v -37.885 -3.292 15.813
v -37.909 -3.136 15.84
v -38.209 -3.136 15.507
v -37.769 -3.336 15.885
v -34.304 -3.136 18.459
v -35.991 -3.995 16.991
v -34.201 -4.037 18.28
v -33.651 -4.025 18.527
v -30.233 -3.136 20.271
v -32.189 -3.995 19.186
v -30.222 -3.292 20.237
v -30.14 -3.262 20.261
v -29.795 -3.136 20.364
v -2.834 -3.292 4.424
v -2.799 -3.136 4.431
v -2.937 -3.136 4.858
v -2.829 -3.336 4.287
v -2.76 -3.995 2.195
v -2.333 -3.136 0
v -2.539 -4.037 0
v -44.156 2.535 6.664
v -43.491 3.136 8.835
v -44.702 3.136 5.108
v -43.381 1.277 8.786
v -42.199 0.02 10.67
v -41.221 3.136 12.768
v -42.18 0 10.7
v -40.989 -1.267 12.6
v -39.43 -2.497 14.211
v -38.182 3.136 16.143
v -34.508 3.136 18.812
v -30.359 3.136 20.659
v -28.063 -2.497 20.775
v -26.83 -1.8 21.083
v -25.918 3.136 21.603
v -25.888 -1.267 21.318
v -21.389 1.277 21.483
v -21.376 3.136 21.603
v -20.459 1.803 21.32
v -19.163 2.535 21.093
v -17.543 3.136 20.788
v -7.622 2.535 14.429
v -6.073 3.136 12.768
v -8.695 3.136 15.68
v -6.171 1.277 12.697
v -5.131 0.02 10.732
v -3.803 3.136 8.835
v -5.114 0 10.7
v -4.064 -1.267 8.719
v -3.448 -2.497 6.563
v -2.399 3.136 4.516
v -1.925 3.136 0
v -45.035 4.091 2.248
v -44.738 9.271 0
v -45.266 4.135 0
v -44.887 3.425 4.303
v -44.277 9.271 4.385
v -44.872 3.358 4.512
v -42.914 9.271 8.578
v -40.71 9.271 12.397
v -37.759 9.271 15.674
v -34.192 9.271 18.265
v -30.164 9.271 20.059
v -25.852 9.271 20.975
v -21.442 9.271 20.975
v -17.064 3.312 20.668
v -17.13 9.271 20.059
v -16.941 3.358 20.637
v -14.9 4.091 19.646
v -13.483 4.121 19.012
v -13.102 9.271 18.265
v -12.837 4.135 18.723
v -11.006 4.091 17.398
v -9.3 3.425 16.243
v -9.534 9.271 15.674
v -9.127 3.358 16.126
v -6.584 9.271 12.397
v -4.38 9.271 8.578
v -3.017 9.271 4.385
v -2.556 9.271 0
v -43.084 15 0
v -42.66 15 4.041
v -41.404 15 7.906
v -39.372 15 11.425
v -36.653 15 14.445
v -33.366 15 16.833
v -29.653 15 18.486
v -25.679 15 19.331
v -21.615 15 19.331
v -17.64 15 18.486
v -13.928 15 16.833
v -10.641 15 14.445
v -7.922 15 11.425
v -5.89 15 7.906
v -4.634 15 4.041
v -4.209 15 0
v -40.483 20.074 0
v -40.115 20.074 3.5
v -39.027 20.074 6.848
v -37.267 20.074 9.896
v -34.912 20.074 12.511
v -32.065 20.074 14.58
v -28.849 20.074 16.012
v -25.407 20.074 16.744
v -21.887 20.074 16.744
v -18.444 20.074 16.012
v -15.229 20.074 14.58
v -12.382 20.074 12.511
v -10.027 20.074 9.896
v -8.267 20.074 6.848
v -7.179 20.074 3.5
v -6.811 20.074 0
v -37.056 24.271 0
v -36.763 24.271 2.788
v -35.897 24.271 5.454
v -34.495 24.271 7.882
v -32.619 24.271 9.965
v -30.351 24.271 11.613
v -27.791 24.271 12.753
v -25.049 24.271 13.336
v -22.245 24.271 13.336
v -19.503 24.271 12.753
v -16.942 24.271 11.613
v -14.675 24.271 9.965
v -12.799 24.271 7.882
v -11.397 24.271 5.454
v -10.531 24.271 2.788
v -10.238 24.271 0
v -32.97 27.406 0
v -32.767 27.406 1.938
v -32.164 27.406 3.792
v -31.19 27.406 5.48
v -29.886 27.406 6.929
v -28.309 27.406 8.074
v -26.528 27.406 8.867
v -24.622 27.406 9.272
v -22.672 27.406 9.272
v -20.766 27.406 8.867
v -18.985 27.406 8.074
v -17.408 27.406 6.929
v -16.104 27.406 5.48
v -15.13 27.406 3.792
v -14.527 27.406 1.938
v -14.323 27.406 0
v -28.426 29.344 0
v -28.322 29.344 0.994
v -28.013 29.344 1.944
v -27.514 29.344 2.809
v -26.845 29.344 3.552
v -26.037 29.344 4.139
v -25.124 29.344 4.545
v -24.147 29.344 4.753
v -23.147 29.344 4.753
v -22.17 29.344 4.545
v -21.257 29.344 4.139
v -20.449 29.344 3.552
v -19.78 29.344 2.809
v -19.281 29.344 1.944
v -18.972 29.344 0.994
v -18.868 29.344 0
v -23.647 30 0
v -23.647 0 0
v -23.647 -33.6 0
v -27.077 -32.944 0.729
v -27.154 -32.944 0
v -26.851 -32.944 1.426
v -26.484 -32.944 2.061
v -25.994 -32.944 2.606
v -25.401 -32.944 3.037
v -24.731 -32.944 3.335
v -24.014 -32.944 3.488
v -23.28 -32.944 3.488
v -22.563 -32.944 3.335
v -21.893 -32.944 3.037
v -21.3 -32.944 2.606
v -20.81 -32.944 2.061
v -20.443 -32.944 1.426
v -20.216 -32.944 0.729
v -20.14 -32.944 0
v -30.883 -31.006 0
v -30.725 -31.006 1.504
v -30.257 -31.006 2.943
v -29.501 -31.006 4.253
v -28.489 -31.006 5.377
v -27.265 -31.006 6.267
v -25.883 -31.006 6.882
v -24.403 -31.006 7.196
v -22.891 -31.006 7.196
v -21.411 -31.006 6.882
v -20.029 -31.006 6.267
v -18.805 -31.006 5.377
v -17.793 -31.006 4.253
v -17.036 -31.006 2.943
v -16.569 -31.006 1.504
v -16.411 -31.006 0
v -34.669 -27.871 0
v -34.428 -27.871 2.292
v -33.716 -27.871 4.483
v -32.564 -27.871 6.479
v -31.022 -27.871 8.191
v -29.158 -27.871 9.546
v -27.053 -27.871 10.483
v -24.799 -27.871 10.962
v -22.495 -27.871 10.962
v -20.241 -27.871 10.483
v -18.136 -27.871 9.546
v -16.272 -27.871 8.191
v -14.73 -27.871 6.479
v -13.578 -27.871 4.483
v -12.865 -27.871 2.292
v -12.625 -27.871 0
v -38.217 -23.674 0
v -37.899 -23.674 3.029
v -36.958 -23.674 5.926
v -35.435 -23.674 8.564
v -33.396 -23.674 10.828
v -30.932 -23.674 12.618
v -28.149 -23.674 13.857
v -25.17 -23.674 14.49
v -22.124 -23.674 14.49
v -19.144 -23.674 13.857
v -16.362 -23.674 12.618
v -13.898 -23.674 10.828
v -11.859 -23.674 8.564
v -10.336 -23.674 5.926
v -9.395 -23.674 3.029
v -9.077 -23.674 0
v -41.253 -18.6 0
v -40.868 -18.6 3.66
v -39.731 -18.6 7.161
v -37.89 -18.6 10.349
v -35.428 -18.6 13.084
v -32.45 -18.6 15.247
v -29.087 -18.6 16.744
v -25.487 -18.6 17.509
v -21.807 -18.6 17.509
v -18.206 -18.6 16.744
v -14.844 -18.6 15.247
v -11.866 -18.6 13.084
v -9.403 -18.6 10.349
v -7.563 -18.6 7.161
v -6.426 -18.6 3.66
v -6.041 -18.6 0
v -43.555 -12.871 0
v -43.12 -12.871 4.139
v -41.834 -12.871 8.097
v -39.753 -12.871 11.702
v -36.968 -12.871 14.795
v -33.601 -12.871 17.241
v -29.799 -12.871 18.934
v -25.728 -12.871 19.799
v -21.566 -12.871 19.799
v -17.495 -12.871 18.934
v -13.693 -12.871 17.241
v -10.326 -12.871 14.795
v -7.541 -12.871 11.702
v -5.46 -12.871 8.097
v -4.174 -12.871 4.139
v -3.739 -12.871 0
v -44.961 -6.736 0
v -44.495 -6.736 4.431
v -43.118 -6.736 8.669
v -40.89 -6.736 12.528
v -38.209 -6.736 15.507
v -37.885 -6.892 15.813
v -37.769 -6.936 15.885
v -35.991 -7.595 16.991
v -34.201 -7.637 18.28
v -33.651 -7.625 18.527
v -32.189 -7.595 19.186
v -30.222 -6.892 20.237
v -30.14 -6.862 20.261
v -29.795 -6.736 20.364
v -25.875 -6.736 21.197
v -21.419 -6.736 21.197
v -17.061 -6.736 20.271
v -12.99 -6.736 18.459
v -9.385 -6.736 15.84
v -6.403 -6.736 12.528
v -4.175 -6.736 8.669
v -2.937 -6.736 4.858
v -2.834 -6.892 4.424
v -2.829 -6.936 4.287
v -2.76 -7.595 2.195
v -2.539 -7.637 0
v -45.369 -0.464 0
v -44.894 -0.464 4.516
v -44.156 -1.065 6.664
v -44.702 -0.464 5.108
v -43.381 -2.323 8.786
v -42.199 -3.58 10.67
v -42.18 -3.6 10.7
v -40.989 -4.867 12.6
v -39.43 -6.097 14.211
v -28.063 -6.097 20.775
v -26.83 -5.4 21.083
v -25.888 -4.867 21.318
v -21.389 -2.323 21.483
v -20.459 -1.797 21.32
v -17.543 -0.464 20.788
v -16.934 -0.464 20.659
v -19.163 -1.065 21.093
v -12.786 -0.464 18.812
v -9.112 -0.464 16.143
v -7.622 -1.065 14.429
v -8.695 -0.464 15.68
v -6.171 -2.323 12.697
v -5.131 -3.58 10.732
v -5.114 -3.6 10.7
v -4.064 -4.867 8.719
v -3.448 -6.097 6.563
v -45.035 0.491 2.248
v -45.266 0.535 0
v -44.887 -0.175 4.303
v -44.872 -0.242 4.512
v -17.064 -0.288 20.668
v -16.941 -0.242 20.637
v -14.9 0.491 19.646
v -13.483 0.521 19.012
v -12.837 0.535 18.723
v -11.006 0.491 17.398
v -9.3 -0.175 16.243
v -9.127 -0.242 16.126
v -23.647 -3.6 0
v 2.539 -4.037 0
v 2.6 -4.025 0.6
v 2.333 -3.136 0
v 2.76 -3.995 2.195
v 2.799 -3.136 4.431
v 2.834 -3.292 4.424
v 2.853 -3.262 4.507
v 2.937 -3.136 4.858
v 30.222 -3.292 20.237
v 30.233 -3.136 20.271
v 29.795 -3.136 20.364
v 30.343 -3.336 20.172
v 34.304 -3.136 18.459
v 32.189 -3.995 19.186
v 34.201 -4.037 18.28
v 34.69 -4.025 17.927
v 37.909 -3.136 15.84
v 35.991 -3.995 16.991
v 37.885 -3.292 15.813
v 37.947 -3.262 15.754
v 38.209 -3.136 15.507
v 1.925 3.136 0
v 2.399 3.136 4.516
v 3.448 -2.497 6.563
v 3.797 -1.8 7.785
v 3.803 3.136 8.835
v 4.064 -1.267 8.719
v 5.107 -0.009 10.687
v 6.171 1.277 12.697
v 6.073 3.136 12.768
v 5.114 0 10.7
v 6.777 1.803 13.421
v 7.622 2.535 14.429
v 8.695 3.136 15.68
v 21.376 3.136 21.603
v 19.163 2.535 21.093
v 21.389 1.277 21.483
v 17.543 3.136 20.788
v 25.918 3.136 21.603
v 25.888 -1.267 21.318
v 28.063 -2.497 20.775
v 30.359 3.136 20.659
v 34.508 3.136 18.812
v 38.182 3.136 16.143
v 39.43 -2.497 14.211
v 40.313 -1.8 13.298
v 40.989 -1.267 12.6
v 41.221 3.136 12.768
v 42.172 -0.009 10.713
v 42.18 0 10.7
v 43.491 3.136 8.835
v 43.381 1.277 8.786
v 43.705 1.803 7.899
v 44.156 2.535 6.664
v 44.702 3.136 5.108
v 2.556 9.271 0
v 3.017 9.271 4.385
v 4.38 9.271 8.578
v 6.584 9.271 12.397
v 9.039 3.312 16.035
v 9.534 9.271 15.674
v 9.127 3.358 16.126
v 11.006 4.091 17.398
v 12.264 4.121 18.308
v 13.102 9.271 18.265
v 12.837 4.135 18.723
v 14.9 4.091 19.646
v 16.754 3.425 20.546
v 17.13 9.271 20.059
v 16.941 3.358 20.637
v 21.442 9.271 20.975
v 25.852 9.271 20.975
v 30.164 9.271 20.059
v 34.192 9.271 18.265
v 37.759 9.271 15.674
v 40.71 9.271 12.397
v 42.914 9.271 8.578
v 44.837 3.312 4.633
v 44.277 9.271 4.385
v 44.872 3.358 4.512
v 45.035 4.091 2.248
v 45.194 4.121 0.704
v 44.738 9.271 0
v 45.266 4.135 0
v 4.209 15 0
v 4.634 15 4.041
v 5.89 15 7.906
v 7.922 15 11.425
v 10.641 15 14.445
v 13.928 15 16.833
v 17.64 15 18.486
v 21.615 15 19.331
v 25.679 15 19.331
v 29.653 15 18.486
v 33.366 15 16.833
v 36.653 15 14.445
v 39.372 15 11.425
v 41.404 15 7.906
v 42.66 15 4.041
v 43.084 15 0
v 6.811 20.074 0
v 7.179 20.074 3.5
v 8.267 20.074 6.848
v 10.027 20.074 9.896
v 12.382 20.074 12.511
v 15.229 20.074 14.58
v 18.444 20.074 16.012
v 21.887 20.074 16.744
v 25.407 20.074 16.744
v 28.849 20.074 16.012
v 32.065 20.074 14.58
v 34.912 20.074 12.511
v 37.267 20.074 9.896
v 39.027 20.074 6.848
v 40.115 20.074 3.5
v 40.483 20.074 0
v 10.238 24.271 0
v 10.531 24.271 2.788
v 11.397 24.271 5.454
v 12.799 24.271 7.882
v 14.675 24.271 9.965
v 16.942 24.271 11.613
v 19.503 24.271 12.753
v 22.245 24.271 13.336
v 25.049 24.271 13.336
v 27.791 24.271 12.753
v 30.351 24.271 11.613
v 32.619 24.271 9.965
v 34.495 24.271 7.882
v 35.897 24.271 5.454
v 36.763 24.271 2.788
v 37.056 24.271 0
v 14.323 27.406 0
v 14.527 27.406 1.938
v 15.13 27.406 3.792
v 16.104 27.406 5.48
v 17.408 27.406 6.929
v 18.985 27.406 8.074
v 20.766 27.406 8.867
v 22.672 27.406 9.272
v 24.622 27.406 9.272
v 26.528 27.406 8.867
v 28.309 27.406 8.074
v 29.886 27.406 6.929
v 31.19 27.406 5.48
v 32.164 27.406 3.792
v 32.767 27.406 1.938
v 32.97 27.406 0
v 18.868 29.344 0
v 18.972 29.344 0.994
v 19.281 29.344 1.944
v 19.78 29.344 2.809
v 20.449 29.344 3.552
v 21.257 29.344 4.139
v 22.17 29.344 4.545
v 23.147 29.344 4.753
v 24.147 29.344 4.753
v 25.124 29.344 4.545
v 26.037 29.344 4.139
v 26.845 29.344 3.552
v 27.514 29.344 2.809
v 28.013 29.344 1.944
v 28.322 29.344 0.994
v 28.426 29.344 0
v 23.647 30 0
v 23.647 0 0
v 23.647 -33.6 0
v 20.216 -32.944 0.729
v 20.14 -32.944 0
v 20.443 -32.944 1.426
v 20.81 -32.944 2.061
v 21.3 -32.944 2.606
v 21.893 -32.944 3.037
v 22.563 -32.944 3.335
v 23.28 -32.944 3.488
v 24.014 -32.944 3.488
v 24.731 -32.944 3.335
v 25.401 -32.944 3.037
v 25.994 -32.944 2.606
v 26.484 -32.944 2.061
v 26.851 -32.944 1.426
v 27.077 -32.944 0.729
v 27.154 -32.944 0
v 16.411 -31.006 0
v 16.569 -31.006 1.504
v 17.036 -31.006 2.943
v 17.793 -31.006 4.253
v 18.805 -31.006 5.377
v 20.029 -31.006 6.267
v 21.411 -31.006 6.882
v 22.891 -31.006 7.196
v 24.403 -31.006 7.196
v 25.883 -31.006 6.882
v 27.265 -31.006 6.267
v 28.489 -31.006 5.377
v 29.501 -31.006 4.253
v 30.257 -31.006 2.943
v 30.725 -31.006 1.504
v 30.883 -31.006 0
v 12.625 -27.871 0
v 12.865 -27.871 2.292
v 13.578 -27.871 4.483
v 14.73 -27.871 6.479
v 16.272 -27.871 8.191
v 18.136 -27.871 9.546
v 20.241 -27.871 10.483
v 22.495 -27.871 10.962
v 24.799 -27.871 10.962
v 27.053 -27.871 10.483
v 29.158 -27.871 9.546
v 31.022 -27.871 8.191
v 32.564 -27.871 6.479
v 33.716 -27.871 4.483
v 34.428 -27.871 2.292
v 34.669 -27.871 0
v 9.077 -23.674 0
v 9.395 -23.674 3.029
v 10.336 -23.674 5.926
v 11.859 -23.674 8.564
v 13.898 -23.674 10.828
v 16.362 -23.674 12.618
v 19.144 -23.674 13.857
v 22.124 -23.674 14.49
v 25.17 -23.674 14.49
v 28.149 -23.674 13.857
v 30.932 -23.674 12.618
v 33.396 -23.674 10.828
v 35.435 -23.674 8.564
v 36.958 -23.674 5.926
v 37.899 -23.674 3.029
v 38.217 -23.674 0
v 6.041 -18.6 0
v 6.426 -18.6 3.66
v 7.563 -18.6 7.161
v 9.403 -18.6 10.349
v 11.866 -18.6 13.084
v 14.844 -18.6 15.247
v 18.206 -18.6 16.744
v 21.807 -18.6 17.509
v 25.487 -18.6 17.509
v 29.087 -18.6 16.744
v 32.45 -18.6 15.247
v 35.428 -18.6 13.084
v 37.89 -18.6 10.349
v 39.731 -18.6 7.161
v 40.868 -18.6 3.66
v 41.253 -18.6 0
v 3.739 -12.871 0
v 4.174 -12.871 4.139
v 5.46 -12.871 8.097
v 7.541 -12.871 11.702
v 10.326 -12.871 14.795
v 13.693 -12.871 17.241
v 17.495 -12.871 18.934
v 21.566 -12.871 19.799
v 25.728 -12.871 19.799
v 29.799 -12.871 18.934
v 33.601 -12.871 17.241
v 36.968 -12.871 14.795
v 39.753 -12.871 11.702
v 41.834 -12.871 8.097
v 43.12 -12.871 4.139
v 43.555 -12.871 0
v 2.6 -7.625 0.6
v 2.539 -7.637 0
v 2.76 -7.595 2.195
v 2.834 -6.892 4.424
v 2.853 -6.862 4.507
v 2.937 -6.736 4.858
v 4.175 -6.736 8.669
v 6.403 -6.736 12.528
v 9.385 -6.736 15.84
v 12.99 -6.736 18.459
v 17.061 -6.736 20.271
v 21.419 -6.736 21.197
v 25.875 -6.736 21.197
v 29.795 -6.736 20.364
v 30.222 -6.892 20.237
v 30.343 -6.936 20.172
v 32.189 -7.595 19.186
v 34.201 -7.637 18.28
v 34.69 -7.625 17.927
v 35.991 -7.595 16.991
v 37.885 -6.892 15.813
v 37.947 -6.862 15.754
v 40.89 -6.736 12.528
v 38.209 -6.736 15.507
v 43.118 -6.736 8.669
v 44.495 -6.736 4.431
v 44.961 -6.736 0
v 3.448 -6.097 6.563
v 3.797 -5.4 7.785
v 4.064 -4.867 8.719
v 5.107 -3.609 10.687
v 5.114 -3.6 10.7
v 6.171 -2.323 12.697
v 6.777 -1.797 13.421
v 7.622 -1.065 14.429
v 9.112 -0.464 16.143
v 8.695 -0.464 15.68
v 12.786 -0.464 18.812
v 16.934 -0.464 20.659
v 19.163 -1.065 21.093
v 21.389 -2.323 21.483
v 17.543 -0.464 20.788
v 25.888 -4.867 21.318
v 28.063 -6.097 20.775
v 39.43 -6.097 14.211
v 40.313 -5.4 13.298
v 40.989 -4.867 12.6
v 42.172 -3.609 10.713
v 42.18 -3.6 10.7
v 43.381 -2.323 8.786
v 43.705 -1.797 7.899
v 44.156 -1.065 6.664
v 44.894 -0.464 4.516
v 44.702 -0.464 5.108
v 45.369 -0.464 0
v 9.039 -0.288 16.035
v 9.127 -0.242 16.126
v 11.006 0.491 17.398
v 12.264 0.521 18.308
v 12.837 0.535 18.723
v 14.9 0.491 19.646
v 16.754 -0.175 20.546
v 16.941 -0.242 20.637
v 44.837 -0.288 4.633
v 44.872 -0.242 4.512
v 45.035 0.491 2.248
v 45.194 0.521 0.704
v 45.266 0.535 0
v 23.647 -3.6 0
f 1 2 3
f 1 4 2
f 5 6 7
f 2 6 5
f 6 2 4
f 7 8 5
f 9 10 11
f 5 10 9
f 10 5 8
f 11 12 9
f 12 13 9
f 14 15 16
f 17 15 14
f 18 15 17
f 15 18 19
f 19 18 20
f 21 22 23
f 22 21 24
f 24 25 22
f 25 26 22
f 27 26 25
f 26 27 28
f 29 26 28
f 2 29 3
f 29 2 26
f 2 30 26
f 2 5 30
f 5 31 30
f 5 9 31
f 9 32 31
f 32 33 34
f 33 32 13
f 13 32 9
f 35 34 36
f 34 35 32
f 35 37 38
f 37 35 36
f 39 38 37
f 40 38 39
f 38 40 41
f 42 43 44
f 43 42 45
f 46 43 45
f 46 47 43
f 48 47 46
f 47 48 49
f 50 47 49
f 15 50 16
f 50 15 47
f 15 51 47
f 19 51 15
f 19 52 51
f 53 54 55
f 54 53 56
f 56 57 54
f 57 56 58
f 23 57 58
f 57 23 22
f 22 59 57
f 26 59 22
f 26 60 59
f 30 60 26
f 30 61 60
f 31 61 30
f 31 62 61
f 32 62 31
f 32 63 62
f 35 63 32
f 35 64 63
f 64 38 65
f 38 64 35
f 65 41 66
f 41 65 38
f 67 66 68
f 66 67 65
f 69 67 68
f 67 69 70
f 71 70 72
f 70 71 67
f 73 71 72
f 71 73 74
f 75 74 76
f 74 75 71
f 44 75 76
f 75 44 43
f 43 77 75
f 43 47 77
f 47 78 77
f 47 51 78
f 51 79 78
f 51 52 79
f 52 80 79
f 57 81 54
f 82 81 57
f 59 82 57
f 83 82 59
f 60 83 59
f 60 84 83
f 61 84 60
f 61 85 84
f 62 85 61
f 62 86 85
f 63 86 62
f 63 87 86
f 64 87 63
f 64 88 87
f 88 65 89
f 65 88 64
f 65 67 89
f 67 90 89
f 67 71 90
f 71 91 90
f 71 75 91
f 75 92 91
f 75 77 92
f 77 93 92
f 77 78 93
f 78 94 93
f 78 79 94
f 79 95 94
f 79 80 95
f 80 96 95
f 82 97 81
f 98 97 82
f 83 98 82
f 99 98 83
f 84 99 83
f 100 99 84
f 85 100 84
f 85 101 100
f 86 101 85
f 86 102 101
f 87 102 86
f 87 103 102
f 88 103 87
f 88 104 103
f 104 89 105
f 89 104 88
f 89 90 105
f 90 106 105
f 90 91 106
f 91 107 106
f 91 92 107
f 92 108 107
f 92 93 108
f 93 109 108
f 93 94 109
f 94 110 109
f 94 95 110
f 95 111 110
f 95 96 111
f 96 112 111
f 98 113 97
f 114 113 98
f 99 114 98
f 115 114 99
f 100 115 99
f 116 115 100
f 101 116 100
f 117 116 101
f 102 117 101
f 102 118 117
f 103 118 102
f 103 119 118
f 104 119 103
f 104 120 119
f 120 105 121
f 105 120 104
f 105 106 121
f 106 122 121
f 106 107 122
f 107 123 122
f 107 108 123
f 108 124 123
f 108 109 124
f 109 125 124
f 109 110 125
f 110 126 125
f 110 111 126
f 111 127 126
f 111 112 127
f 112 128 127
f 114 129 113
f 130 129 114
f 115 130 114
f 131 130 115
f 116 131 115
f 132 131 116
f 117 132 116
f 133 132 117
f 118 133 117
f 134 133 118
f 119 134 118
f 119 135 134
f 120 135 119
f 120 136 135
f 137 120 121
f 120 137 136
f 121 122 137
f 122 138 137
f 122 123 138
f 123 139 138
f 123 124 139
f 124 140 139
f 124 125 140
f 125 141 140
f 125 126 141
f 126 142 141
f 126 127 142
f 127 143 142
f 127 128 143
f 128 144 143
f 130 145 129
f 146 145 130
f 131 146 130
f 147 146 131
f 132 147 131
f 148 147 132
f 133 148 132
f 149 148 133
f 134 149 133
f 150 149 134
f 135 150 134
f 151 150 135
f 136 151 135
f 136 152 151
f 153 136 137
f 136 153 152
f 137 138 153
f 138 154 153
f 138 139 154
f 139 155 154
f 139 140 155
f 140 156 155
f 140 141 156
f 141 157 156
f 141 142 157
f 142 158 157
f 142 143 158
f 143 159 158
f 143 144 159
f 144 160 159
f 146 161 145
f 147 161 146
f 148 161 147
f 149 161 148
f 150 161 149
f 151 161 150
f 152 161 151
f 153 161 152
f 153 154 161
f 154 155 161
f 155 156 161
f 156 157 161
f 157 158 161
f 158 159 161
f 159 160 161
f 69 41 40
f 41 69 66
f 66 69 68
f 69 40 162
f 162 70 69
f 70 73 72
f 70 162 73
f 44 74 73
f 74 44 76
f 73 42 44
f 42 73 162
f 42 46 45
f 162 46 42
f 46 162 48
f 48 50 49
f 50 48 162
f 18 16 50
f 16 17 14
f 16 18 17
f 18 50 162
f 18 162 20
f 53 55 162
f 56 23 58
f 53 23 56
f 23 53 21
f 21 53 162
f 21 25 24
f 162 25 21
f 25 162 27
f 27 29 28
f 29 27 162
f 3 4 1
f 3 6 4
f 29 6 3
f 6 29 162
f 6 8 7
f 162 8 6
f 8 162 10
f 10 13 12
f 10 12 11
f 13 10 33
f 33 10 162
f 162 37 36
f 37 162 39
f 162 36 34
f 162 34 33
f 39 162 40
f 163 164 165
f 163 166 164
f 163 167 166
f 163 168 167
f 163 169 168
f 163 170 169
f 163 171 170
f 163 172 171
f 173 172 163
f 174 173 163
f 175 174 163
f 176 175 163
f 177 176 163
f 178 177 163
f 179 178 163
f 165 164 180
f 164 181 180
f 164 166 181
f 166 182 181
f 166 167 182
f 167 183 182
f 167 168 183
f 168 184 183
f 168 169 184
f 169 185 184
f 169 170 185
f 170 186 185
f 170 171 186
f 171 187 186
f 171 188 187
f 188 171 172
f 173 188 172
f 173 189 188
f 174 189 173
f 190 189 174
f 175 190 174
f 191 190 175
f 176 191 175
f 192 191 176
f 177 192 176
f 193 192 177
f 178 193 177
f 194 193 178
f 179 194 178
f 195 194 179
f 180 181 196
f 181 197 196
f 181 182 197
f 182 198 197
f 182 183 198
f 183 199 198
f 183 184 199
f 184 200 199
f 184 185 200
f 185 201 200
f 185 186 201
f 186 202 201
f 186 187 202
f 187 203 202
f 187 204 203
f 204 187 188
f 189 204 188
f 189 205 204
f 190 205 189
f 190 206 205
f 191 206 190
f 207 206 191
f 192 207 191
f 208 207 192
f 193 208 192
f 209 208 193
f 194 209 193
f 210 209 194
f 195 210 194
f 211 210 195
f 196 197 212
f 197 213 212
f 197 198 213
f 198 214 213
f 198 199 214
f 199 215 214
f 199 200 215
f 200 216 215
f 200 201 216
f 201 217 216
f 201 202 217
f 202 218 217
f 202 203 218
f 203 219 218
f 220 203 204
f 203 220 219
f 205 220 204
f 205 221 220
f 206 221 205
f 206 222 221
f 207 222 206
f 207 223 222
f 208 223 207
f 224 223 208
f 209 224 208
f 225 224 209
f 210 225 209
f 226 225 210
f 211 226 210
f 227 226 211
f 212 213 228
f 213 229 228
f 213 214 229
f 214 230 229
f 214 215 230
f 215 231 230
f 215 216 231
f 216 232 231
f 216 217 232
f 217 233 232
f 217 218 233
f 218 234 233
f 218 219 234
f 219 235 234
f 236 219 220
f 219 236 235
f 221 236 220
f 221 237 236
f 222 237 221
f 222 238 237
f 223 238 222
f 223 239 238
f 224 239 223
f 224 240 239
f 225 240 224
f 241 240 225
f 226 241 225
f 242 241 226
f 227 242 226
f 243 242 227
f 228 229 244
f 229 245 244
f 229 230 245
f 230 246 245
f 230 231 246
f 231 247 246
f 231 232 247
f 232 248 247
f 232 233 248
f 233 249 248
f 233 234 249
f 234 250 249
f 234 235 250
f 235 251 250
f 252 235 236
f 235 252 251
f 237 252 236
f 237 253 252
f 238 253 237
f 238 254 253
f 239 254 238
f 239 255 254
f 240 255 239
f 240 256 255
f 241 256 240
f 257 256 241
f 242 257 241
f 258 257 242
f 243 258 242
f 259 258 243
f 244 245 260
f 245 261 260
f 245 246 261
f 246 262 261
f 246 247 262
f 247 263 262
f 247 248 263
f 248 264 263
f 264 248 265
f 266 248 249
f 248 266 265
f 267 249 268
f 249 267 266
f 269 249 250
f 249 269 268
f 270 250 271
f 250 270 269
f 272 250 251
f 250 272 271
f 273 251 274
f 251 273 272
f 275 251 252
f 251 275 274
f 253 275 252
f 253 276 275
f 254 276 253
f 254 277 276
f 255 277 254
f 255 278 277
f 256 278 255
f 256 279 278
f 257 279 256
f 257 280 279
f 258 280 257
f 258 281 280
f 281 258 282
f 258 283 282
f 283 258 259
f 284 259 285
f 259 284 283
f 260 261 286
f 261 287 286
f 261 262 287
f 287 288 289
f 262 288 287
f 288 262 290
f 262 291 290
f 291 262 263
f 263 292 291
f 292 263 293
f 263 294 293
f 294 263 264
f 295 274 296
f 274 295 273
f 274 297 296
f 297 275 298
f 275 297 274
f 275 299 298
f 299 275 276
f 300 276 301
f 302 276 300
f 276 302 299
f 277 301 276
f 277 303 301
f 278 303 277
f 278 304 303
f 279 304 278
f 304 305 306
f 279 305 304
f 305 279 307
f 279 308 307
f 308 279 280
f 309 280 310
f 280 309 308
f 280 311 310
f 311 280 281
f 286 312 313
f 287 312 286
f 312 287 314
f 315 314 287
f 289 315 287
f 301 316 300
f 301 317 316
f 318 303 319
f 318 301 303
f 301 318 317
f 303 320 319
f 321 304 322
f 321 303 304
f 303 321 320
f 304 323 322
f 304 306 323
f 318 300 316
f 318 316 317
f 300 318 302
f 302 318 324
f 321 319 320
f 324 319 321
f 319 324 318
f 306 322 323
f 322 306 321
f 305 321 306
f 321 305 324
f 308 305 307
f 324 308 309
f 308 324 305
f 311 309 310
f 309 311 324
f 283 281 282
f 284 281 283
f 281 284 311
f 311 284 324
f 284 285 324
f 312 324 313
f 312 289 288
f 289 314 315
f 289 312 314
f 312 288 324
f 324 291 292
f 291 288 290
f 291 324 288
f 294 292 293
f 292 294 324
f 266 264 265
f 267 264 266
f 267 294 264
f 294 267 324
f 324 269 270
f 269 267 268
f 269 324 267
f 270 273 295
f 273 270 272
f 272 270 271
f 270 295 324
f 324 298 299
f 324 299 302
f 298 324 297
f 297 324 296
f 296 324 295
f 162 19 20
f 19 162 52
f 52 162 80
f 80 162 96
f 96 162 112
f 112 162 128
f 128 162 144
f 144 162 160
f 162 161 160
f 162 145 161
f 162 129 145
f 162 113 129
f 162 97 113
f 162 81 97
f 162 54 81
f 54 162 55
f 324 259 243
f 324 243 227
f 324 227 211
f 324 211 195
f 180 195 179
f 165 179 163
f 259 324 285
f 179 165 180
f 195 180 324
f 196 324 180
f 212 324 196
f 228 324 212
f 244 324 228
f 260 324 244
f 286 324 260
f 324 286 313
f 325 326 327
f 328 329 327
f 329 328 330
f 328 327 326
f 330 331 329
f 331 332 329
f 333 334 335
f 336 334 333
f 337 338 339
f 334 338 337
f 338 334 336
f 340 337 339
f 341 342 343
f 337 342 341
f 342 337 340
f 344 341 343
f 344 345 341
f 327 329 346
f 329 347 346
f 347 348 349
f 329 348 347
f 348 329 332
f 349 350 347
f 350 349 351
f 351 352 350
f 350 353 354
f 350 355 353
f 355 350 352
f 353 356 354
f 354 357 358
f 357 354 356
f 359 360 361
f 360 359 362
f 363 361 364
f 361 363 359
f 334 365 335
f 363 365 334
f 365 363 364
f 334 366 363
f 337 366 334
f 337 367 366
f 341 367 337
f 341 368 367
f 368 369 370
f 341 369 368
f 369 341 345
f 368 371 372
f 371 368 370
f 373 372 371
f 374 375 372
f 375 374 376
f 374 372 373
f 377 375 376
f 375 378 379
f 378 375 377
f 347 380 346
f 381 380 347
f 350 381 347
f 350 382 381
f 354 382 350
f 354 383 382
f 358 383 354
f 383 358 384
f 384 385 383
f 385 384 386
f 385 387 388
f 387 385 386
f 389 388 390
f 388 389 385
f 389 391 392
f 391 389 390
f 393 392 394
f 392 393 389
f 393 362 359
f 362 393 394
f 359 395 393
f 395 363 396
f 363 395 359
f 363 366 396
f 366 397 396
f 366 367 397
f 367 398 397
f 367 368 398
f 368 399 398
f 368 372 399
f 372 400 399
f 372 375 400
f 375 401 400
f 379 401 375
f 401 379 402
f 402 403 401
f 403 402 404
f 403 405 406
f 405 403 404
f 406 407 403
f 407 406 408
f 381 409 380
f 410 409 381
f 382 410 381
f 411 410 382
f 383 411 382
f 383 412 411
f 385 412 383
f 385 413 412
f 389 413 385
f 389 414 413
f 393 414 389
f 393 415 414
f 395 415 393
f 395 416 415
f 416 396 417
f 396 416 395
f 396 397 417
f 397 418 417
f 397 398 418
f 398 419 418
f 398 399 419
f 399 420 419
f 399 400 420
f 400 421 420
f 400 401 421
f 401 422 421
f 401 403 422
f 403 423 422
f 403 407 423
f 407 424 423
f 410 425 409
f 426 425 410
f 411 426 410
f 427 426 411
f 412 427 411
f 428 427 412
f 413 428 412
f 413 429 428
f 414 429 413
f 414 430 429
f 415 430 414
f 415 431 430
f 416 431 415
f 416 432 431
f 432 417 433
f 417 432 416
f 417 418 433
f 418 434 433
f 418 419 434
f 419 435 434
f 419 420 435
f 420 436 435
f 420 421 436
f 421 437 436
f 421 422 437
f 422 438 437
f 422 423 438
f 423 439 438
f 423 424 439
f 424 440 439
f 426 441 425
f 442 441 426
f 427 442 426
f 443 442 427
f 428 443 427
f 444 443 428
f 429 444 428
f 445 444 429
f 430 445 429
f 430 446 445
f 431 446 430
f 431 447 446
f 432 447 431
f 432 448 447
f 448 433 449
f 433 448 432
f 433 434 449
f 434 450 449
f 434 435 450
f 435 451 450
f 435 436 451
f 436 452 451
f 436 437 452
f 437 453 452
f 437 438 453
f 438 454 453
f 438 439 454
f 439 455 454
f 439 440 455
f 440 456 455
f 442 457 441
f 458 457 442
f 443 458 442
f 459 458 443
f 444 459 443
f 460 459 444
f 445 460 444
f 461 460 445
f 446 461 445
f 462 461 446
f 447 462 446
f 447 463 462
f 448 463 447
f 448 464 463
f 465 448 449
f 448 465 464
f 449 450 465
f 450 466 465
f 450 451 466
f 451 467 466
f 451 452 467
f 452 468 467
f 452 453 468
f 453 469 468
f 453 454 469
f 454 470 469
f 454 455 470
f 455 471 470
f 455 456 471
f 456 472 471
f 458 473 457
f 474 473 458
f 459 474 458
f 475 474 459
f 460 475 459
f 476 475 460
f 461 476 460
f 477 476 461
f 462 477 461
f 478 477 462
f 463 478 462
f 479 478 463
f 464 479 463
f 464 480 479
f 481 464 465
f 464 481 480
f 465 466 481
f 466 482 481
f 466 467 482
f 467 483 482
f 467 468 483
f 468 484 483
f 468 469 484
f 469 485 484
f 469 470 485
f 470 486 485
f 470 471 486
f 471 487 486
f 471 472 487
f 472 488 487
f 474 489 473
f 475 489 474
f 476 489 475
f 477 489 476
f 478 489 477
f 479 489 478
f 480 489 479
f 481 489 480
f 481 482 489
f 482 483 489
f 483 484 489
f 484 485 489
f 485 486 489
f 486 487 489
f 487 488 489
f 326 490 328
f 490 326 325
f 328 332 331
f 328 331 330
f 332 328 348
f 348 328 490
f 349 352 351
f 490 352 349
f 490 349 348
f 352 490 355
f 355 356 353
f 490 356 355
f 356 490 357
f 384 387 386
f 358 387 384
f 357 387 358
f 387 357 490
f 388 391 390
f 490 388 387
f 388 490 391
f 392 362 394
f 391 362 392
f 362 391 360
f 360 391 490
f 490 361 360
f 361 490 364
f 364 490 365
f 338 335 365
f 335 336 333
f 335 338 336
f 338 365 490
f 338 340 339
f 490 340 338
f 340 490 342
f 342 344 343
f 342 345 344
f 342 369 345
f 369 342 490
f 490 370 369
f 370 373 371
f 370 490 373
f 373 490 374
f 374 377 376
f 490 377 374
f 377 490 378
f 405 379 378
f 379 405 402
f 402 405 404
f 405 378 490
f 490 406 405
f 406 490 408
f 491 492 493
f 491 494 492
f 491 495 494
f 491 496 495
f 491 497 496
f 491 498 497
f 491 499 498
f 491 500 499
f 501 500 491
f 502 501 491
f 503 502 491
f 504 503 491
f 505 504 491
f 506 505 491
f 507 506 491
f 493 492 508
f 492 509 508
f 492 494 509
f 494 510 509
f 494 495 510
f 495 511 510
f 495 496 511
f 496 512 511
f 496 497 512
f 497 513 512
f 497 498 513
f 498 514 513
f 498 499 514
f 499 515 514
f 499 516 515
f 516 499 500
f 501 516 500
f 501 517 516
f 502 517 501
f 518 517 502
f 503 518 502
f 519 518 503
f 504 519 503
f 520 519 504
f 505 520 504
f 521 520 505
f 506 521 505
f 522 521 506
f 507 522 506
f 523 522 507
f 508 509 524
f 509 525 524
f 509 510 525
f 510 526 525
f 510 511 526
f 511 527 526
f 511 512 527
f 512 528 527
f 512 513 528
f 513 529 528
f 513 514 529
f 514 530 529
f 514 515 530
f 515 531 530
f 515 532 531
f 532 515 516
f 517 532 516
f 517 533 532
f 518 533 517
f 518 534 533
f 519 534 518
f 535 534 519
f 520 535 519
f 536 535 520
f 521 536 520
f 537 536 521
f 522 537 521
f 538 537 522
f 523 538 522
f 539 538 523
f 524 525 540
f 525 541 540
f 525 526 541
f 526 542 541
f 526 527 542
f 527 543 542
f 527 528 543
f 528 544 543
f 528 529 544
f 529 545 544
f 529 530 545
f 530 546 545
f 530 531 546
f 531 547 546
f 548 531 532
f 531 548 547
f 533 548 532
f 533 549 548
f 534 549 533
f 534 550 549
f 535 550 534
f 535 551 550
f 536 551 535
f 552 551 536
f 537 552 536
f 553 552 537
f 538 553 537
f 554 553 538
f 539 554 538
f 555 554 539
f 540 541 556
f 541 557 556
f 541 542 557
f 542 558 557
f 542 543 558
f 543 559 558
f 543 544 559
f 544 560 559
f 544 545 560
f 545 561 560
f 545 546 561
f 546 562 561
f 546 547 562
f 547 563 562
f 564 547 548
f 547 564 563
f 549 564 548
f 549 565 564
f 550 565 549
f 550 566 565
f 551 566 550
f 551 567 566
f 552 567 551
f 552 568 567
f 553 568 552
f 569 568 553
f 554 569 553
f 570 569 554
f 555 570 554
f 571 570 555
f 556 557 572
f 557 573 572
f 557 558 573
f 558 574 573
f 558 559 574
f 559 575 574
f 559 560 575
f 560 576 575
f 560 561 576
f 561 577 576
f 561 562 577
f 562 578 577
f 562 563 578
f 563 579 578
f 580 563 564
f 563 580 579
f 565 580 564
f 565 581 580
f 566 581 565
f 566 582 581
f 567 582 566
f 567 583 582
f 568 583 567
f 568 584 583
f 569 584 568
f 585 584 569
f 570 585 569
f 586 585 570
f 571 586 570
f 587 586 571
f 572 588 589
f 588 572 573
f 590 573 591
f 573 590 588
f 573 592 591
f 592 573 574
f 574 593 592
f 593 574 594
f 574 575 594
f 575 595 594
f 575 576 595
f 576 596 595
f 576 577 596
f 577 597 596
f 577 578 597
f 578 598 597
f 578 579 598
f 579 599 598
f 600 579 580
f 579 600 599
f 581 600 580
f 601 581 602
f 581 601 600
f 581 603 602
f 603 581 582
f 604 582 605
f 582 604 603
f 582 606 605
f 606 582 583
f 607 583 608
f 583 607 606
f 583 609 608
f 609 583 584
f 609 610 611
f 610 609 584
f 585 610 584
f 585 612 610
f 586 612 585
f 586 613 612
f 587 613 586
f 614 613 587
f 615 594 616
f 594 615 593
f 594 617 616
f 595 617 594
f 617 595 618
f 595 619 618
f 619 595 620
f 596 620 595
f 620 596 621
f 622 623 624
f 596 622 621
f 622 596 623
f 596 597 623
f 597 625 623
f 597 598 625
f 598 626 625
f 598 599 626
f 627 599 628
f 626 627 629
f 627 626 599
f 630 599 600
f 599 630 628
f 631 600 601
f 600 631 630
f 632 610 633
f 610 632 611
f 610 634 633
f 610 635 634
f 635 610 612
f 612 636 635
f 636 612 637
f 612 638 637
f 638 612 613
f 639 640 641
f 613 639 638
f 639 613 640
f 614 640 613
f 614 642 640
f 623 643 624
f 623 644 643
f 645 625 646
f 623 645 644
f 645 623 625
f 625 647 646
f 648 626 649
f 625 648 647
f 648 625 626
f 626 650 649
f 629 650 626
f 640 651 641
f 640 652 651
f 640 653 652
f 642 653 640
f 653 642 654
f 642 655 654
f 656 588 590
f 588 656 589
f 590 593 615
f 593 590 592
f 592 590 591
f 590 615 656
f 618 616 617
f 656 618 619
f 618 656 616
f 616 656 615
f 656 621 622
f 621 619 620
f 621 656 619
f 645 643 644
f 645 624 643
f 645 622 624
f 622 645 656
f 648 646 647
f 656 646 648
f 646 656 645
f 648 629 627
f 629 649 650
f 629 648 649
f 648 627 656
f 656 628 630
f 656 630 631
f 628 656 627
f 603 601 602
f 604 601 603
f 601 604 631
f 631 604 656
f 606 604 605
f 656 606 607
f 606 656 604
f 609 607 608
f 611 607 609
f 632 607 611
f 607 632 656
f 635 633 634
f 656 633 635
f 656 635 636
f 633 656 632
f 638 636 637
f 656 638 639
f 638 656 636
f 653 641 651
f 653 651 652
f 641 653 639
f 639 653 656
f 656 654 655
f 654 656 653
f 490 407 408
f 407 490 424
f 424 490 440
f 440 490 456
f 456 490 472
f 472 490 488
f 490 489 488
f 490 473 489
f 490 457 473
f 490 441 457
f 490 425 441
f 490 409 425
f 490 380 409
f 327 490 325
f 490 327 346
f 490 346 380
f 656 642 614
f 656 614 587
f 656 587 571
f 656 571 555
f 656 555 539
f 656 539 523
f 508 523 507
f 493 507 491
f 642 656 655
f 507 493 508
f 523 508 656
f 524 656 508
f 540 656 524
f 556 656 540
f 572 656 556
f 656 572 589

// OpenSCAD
//Easter Egg Maker 2016 from Richard Swika'
//Rev: 1.3.28.0 - centered abssin function for more even pieces
//Rev: 1.3.27.0 - first version
//2014-2016 Richard Swika -  Creative Commons - Attribution - Non-Commercial license.

/* [EggOMatic] */
//use 1 for draft; turn up to 5 for best quality but slower regenerate
Quality=1; //[1:5]

//number of pieces cut across long axis of egg
AxleSliceCount=2; //[1:10]

//type of wave used for cutter (does not apply for flat cutter)
Shape="sin"; //[sin,abssin,tri,saw,square]

//type of cutter used on long axis of egg
Cutter="radial"; //[flat,linear,radial]

//Number of cycles for cutter wave
Cycles=3; //[1:16]

//Relative amplitude of cutter wave (normally keep this at 1 or 2, depending on slice count)
Amp=2; //[0:9]

//number of rotary slices (normally keep this at 2; use caution with values greater than 2)
RotarySliceCount=2; //[2:12]

Samples=Quality*10*Cycles;

/* [Size and Shape] */

//Length of the egg (mm)?.
egg_length=60; //[30:200]

//What shape egg? (use 7 for a hen egg; 0 for a sphere; 100 for a blimp)
egg_shape=7; //[0:100]

/* [Hidden] */
// preview[view:top, tilt:top]
tiny=0.001;
space=2; //2 mm between parts on build plate

//set true to turn off the demo egg so you can use the modules instead
moduleMode=false; //[false,true];

//when false the egg will have quads where possible instead of all trigons
//this can lead to problems with non-plannar surfaces when using csg
//so only use it true if when not using a base
allTrigon=true; //[false,true]
ucount=30*Quality;
vcount=15*Quality;

function ud(ui) = ui*360/ucount;
function vd(vi) = vi*180/vcount;

//egg equation adapted from http://www16.ocn.ne.jp/~akiko-y/Egg
//(y^2 + z^2)^2=4z^3 + (4-4c)zy^2
// c=0.7 produces an almost perfect hen egg outline+
// c=0 produces a perfect sphere
// c>1 produces an elongated egg shape
//z ranges from 0 to 1
function egg_outline(c,z)= z >=1 ? 0 : (sqrt(4-4*c-8*z+sqrt(64*c*z+pow(4-4*c,2)))*sqrt(4*z)/sqrt(2))/4;

//map the egg's surface from uv to xyz with these functions
//function x(ui,r) = r * sin(ui*360/(ucount-1));
function x(ui,r) = r * sin(ud(ui));
function y(ui,r) = r * cos(ud(ui));
function z(vi,r) = r * cos(vd(vi));	
function n(vi,r) = r * sin(vd(vi));	
function zi(vi) = (1+cos(vd(vi)))/2;	
center = 0.5; //set to 1 to center at small end; 0 to center on fat end

//to avoid degenerate geometry at the poles we can not use quads 
//so we will generate phantom points as if we were using quads, but use tris instead 
//just to simplify indexing, but will only link faces to a single point at each pole
//but we will use the phantom points to calculate average displacement at each pole
//lets make an egg
points = [ for (vi=[0:vcount]) 
    for (ui = [0 : ucount-1]) 
        let (r=egg_outline(egg_shape/10,1-zi(vi))) 
                    [x(ui,r), y(ui,r),(zi(vi))-center]];
//echo(points=points);
faces =  (allTrigon)     
 ? [ for (vi=[0:vcount-1]) for (ui = [0:ucount-1])  for (p=[0:1])
    (vi==0)&&(p==0) ? [vi*ucount,ui+(vi+1)*ucount,(ui+1) % ucount+(vi+1)*ucount]
    : (vi==vcount-1)&&(p==0) ? [(ui+1) % ucount+vi*ucount,ui+vi*ucount,(vi+1)*ucount]
    : (p==0) ? [(ui+1) % ucount+vi*ucount,ui+vi*ucount,ui+(vi+1)*ucount]
    :[(ui+1) % ucount+vi*ucount,ui+(vi+1)*ucount,(ui+1)%ucount+(vi+1)*ucount]] 
: [ for (vi=[0:vcount-1]) for (ui = [0:ucount-1])  
    (vi==0) ? [vi*ucount,ui+(vi+1)*ucount,(ui+1) % ucount+(vi+1)*ucount]
    : (vi==vcount-1) ? [(ui+1) % ucount+vi*ucount,ui+vi*ucount,(vi+1)*ucount]
    : [(ui+1) % ucount+vi*ucount,ui+vi*ucount,ui+(vi+1)*ucount,(ui+1)%ucount+(vi+1)*ucount]] ;
//echo(faces=faces);

//an adjustable Egg
module Egg(egg_length=egg_length,egg_shape=egg_shape){
     scale (egg_length) rotate([0,0,-90]) polyhedron(points=points,faces=faces);
}    

//2016 "Egg-O-Matic" Code follows
function frac(x)=x-floor(x);
//All "fancy" cuts are done with these wave functions
function wave(kind,x) = kind=="sin" ? sin(x*180) : 
                                      kind=="abssin" ? 2*abs(sin(x*180))-1:
                                      kind=="square" ? (frac(x)<0.5?1:-1): 
                                      kind=="saw" ? (2*frac(x)-1): 
                                      kind=="tri" ? (frac(x)<0.5?-1+frac(x)*4 : 3-frac(x)*4) : x-floor(x);

//Declare a blade to make fancy linear cuts
module linearCutter(Shape="tri",Cycles=1,Amp=1,Samples=100){
    bottom=[for (x=[-1.05:1/Samples:1.05]) [x,1+(Amp+Amp*wave(Shape,x*Cycles))/10]];
    top = [[1.05,-1],[-1.05,-1]];
    color("red")
    rotate([-90,0,0]) 
    translate([0,0,-1])
        linear_extrude(height = 2)
            polygon(points=concat(bottom,top));
}
//Declare a blade to make fancy radial cuts
module radialCutter(Shape="abssin",Cycles=3,Amp=1,Samples=160){
    lowerpoints = concat([[0,0,-1-Amp/10]],
                        [ for (i=[0:1/Samples:1-1/Samples+tiny])[sin(i*360),
                            cos(i*360),-1-(Amp+Amp*wave(Shape,i*2*Cycles))/10]]);
    upperpoints = concat([[0,0,1]],
                        [ for (i=[0:1/Samples:1-1/Samples+tiny])[sin(i*360),cos(i*360),1]]);
   cutterpoints = concat(lowerpoints,upperpoints);
   //echo (cutterpoints);
   lowerfaces = [ for (i=[1:Samples])  [0,i==Samples ? 1 : i+1,i]]; //normals reversed
   upperfaces = [ for (i=[Samples+2:2*Samples+1])  [Samples+1,i,i==Samples*2+1 ? Samples+2 : i+1]];
   endfacesquad= [for (i=[1:Samples-1])  [i,i+1,i+Samples+2,i+Samples+1]];
   cutterfaces = concat(lowerfaces,upperfaces,endfacesquad,[[Samples,1,Samples+2,Samples*2+1]]);    
   //echo("faces:",upperfaces);
    color("red")
    polyhedron(cutterpoints,cutterfaces);
}

//allow the various cutters to be selected 
module multiCutter(Cutter="flat",Shape="sin",Cycles=3,Amp=1,Samples=160){
    if (Cutter=="radial")
       radialCutter(Shape,Cycles,Amp,Samples);
    else if (Cutter=="linear")
       linearCutter(Shape,Cycles,Amp,Samples);
    else //Flat cutter uses a cube
       cube(2,center=true);
}

module subSlice(z,deltaZ,n) //part, cutter
{
    //slice off a section
    translate([0,0,z/10])
    difference(){
        children(0); //Part
        children(1); //Cutter
    }
    //continue slicing up the remainder 
    if (n>1) {
        subSlice(z+deltaZ,deltaZ,n-1) {
            intersection(){//Part advanced one step (section above removed)
                children(0); //Part
                children(1); //Cutter           
            }
        translate([0,0,deltaZ]) children(1); //Advanced cutter one step
        }
    }
}

//declare an operator to recursively slice a part into N sections
//it operates on two children, the part to be sliced and the cutter
//the part and cutter must be at the origin
//the cutter must be positioned surrounding the part with the cutting edge on
//the negative Z axis not touching the part
//Scale is 1 for a bounding box of radius 1
module sliceOmatic(N=1,Scale=1,Amp=1) //part cutter
{
   deltaZ= (Cutter=="flat") ? Scale*2/N : Scale*(2+Amp/5)/N;
   subSlice(0,deltaZ,N) {
       children(0); //Part(s)
       translate([0,0,deltaZ]) children(1); //Advance cutter one step
   }
}

//rotary-slice a section from the part from A0 to A1 and align it for printing
module rotarySlice(A0=90,A1=120,Scale=1) //part
{
    rotate([0,0,-A0])
    intersection(){
        children();
        difference() {
            rotate([0,0,A0]) translate([0,Scale,0]) cube(2*Scale,center=true);
            rotate([0,0,A1]) translate([0,Scale,0]) cube(2*Scale,center=true);
        }
    }
}
//slice the part into N sections by rotating a straight cutter about the Z axis
module rotarySlicer(N=2,Scale=1) //part
{
    //figure out where to place the first section and the spacing between them
    spacefactor = N==2 ? 2 : 1.5; //pack sections without overlapping
    spacedelta=spacefactor*(space+Scale*egg_outline(egg_shape/10,0.5));
    spaceoffset = -spacedelta*((N/2)-1/2);
    if (N<2) children();
        else {
            delta=360/N;
            for (n=[0:N-1]) {
                translate([spaceoffset+spacedelta*n ,0,0]) rotarySlice(n*delta,(n+1)*delta,Scale) children();
            }
        }  
}

//this generates the main object
if (!moduleMode) {
     rotate([90,0,0]) //flat on build plate
      rotarySlicer(RotarySliceCount,Scale=egg_length)
         sliceOmatic(AxleSliceCount,egg_length/2,Amp) 
    {
                   Egg();
//                   translate([egg_length/2,0,0])
                        scale(egg_length/2) multiCutter(Cutter,Shape,Cycles,Amp,Samples);
    }
 }
